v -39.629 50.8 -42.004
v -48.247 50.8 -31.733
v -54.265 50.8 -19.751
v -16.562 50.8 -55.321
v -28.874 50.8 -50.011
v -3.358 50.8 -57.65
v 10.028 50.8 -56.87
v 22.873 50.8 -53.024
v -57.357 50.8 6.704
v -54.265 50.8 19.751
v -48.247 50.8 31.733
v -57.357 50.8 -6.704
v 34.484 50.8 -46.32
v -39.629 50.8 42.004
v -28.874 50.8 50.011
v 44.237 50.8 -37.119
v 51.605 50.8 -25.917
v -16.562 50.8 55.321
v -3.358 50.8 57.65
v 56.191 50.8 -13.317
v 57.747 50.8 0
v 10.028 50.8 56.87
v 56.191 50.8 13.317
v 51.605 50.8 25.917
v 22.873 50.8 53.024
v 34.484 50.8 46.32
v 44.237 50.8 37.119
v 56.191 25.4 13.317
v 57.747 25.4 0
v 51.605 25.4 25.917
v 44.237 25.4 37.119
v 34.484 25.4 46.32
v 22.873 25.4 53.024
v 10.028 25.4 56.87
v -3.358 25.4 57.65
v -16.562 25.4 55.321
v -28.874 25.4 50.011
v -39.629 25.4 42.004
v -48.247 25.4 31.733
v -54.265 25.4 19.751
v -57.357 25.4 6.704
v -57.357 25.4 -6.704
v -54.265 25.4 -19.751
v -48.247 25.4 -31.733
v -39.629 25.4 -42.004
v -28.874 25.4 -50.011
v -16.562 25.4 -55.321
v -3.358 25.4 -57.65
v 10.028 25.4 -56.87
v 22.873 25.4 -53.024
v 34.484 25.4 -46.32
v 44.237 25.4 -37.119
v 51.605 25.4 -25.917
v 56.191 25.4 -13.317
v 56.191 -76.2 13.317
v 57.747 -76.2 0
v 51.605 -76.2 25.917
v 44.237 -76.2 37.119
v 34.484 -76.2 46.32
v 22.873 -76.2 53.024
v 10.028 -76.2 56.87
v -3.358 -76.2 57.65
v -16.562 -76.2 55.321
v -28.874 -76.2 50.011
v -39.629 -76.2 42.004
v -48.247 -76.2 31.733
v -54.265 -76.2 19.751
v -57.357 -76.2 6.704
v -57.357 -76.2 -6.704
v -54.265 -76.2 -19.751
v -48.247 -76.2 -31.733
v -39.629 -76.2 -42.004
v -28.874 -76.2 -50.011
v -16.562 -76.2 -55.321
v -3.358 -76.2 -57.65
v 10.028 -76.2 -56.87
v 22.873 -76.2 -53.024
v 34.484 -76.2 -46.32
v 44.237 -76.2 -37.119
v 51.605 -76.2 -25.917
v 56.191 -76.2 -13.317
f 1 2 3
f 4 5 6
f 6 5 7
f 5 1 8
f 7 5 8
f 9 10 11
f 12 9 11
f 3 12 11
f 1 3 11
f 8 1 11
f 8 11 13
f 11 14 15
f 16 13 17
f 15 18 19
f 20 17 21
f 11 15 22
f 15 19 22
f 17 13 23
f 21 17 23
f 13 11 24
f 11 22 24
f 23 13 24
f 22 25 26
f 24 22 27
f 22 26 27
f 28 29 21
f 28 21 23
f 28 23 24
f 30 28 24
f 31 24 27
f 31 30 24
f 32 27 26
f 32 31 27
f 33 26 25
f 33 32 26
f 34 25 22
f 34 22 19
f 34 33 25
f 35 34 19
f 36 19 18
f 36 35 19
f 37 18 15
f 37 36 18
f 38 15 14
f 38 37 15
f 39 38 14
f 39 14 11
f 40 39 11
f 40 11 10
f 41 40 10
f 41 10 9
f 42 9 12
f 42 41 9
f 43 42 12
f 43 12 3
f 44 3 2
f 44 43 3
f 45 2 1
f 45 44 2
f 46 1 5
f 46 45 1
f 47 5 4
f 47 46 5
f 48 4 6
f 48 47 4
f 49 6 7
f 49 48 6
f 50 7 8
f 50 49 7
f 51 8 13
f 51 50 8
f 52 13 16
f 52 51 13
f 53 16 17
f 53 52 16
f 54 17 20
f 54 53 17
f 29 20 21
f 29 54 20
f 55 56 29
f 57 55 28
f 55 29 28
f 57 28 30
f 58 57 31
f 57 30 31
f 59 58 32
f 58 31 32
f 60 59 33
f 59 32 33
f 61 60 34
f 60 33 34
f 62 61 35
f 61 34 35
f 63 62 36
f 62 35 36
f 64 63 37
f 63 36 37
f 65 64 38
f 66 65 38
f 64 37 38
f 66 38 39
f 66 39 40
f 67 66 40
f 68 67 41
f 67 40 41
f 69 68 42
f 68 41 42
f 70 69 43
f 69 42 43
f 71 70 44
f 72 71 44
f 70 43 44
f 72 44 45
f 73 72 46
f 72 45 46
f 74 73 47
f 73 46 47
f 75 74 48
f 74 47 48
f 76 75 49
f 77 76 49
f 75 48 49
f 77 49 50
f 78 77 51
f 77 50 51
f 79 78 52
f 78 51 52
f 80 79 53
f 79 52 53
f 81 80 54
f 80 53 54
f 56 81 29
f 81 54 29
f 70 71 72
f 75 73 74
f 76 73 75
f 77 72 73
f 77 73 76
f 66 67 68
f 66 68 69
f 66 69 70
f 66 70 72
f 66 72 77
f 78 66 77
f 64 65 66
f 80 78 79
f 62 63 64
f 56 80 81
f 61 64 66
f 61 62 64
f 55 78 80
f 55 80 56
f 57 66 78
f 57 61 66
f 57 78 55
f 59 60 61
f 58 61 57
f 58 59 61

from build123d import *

# Parameters (mm, degrees)
F0_R     = 57.747245906
F1_DEPTH = 25.4
F2_DEPTH = 25.4
F3_DEPTH = 25.4
F4_DEPTH = 25.4
F7_DEPTH = 25.4


# Not quite as in the source:
# - the program builds the solid bodies; features that only make, move or delete a surface that nothing else refers to are left out


with BuildPart() as f1:
    # F0 (on Front) → F1 (new body)
    with BuildSketch(Plane.XZ):
        Circle(F0_R)
    extrude(amount=F1_DEPTH)

    # F2 (add): a face of the model
    f2_faces = [f1.faces().sort_by_distance(p)[0] for p in [
        (0, 0, 0),
    ]]
    extrude(f2_faces, amount=F2_DEPTH)

    # F3 (add): a face of the model
    f3_faces = [f1.faces().sort_by_distance(p)[0] for p in [
        (0, -25.4, 0),
    ]]
    extrude(f3_faces, amount=F3_DEPTH)

    # F4 (add): a face of the model
    f4_faces = [f1.faces().sort_by_distance(p)[0] for p in [
        (0, -50.8, 0),
    ]]
    extrude(f4_faces, amount=F4_DEPTH)

    # F7 (add): a face of the model
    f7_faces = [f1.faces().sort_by_distance(p)[0] for p in [
        (0, 25.4, 0),
    ]]
    extrude(f7_faces, amount=F7_DEPTH)


solid = f1.part
